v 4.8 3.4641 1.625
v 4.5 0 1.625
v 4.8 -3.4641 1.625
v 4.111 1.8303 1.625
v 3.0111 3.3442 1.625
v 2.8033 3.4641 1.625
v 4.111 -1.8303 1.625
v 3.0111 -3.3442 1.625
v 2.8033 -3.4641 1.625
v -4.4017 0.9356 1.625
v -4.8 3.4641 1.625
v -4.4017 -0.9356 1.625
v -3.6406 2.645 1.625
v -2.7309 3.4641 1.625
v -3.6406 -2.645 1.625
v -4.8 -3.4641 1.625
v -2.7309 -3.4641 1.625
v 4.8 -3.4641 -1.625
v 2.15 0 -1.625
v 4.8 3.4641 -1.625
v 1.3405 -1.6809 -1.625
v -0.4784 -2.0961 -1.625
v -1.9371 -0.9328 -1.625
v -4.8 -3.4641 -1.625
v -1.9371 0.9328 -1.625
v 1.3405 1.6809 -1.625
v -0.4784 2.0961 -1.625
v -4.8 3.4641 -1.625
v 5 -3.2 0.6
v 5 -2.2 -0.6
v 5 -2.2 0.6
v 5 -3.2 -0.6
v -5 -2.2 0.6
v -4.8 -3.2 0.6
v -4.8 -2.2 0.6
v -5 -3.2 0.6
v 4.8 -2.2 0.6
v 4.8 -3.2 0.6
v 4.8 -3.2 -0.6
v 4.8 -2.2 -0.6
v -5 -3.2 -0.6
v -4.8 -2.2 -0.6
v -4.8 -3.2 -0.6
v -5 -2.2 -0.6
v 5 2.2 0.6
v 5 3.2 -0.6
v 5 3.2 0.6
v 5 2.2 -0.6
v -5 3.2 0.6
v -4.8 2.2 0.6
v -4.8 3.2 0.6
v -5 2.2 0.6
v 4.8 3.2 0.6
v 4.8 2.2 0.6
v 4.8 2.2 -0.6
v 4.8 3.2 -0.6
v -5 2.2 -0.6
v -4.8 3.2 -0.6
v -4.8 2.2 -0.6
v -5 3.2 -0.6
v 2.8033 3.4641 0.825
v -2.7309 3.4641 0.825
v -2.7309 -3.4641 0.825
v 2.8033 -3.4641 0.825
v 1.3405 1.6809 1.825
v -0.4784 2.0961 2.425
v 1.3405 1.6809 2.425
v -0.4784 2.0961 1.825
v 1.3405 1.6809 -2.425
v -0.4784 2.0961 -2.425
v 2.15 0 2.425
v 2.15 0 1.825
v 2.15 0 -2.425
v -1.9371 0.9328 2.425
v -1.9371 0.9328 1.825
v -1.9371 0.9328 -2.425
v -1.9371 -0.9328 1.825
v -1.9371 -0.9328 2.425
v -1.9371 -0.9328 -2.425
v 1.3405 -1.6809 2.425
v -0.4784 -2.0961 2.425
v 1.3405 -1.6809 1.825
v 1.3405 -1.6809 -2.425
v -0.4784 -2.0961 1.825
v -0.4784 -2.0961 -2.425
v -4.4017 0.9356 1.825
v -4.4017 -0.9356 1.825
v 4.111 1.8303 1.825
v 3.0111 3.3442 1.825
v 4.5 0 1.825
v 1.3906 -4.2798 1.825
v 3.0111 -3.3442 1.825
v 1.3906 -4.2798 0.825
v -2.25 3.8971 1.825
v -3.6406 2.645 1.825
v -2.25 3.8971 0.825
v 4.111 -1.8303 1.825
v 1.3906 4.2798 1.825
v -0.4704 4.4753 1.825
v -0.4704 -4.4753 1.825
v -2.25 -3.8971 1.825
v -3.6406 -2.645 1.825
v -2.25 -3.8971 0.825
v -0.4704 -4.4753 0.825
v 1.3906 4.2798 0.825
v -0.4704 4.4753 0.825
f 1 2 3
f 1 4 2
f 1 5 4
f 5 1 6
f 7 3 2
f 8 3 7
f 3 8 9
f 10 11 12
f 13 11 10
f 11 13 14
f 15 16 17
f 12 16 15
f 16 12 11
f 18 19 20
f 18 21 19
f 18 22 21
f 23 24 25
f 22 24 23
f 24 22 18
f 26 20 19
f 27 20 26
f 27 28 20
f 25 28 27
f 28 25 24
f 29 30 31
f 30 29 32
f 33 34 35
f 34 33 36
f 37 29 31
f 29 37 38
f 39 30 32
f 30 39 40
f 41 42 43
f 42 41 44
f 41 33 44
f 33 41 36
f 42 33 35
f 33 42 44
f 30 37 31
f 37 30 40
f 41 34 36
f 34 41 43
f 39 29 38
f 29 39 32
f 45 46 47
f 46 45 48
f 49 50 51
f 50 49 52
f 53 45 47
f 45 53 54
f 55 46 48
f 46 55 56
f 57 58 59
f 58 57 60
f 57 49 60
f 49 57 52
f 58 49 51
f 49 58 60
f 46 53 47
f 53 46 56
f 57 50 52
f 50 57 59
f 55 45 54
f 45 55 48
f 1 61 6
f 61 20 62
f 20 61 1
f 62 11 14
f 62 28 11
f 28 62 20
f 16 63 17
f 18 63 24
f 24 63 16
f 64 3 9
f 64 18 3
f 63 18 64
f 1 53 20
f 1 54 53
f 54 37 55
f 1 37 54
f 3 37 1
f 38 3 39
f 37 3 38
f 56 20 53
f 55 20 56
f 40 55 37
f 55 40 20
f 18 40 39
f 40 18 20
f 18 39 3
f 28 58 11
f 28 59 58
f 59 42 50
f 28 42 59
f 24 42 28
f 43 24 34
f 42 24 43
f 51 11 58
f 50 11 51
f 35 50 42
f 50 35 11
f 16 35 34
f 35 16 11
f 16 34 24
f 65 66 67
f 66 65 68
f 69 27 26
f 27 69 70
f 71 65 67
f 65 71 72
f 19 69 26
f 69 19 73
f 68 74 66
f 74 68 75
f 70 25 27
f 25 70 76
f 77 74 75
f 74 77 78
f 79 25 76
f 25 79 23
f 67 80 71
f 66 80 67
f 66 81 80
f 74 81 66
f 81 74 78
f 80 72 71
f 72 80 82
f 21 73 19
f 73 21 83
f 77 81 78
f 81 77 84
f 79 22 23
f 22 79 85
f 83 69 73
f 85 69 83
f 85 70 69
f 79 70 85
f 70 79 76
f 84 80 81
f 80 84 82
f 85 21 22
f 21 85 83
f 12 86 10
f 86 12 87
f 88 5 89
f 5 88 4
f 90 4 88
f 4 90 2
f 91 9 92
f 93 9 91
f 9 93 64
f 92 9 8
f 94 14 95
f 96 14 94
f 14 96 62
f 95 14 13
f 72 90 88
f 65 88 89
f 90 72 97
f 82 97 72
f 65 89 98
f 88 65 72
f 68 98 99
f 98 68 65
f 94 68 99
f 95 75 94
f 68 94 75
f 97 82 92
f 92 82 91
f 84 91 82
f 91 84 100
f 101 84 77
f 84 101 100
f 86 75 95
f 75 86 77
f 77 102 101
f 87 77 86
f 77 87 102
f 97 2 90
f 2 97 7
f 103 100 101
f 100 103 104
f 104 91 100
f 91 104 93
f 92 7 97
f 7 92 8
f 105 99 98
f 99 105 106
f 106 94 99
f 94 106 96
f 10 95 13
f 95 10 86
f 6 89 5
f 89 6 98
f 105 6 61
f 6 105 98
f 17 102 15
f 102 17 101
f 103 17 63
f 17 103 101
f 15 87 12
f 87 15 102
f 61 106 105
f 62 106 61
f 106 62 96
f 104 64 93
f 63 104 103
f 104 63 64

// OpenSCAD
// Parameters
screw_thread_diameter = 4.0; //[2.0:8.0:0.1]
thread_pitch = 0.7; //[0.5:1.25:0.05]
across_flats = 6.0; //[3.0:12.0:0.1]
thickness = 3.25; //[1.6:6.5:0.05]
t_slot_nut_length = 10.0; //[6.0:20.0:0.5]
t_slot_channel_width = 8.0; //[5.0:12.0:0.5]
t_slot_lip_undercut = 1.0; //[0.5:2.5:0.1]
corner_chamfer = 0.2; //[0.0:1.0:0.05]
edge_fillet_radius = 0.0; //[0.0:1.5:0.1]
threaded_hole_type = 0; //[0:1:1]
thread_clearance = 0.3; //[0.0:0.8:0.05]
retention_wing_thickness = 1.2; //[0.6:2.4:0.1]
retention_wing_height_offset = 0.0; //[-0.8:0.8:0.05]
overlap = 0.8; //[0.5:2.0:0.1]
washer_outer_diameter = 9.0; //[6.0:18.0:0.5]
washer_thickness = 1.0; //[0.5:2.5:0.1]
nut_and_washer_gap = 0.0; //[0.0:5.0:0.5]

// Nut and Washer - complete geometry
module nut_and_washer() {
  color("DimGray") {
    // T-slot nut body
    intersection() {
      // Hex outer profile
      translate([0, 0, 0])
        cylinder(r=across_flats/(2*cos(30)), h=thickness, center=true, $fn=6);
      // T-slot nut body block
      translate([0, 0, 0])
        cube([t_slot_nut_length, 2*(across_flats/(2*cos(30))), thickness], center=true);
    }
    
    // Retention wings
    union() {
      translate([0, -(across_flats/2 + t_slot_lip_undercut/2 - overlap), retention_wing_height_offset])
        cube([t_slot_nut_length, t_slot_lip_undercut, retention_wing_thickness], center=true);
      translate([0, (across_flats/2 + t_slot_lip_undercut/2 - overlap), retention_wing_height_offset])
        cube([t_slot_nut_length, t_slot_lip_undercut, retention_wing_thickness], center=true);
    }
    
    // Lead-in chamfers
    difference() {
      translate([0, 0, 0])
        cube([t_slot_nut_length, 2*(across_flats/(2*cos(30))), thickness], center=true);
      translate([t_slot_nut_length/2 - corner_chamfer/2, 0, 0])
        cube([corner_chamfer, 2*(across_flats/(2*cos(30))), thickness + 2*overlap], center=true);
      translate([-(t_slot_nut_length/2 - corner_chamfer/2), 0, 0])
        cube([corner_chamfer, 2*(across_flats/(2*cos(30))), thickness + 2*overlap], center=true);
    }
    
    // Threaded hole
    difference() {
      translate([0, 0, 0])
        cylinder(r=(screw_thread_diameter + thread_clearance)/2, h=thickness + 2*overlap, center=true);
    }
  }
  
  // Washer
  color("Silver") {
    difference() {
      translate([0, 0, thickness/2 + washer_thickness/2 - overlap + nut_and_washer_gap])
        cylinder(r=washer_outer_diameter/2, h=washer_thickness, center=true);
      translate([0, 0, thickness/2 + washer_thickness/2 - overlap + nut_and_washer_gap])
        cylinder(r=(screw_thread_diameter + thread_clearance)/2, h=washer_thickness + 2*overlap, center=true);
    }
  }
}

// Assembly
module assembly() {
  nut_and_washer();
}

assembly();
